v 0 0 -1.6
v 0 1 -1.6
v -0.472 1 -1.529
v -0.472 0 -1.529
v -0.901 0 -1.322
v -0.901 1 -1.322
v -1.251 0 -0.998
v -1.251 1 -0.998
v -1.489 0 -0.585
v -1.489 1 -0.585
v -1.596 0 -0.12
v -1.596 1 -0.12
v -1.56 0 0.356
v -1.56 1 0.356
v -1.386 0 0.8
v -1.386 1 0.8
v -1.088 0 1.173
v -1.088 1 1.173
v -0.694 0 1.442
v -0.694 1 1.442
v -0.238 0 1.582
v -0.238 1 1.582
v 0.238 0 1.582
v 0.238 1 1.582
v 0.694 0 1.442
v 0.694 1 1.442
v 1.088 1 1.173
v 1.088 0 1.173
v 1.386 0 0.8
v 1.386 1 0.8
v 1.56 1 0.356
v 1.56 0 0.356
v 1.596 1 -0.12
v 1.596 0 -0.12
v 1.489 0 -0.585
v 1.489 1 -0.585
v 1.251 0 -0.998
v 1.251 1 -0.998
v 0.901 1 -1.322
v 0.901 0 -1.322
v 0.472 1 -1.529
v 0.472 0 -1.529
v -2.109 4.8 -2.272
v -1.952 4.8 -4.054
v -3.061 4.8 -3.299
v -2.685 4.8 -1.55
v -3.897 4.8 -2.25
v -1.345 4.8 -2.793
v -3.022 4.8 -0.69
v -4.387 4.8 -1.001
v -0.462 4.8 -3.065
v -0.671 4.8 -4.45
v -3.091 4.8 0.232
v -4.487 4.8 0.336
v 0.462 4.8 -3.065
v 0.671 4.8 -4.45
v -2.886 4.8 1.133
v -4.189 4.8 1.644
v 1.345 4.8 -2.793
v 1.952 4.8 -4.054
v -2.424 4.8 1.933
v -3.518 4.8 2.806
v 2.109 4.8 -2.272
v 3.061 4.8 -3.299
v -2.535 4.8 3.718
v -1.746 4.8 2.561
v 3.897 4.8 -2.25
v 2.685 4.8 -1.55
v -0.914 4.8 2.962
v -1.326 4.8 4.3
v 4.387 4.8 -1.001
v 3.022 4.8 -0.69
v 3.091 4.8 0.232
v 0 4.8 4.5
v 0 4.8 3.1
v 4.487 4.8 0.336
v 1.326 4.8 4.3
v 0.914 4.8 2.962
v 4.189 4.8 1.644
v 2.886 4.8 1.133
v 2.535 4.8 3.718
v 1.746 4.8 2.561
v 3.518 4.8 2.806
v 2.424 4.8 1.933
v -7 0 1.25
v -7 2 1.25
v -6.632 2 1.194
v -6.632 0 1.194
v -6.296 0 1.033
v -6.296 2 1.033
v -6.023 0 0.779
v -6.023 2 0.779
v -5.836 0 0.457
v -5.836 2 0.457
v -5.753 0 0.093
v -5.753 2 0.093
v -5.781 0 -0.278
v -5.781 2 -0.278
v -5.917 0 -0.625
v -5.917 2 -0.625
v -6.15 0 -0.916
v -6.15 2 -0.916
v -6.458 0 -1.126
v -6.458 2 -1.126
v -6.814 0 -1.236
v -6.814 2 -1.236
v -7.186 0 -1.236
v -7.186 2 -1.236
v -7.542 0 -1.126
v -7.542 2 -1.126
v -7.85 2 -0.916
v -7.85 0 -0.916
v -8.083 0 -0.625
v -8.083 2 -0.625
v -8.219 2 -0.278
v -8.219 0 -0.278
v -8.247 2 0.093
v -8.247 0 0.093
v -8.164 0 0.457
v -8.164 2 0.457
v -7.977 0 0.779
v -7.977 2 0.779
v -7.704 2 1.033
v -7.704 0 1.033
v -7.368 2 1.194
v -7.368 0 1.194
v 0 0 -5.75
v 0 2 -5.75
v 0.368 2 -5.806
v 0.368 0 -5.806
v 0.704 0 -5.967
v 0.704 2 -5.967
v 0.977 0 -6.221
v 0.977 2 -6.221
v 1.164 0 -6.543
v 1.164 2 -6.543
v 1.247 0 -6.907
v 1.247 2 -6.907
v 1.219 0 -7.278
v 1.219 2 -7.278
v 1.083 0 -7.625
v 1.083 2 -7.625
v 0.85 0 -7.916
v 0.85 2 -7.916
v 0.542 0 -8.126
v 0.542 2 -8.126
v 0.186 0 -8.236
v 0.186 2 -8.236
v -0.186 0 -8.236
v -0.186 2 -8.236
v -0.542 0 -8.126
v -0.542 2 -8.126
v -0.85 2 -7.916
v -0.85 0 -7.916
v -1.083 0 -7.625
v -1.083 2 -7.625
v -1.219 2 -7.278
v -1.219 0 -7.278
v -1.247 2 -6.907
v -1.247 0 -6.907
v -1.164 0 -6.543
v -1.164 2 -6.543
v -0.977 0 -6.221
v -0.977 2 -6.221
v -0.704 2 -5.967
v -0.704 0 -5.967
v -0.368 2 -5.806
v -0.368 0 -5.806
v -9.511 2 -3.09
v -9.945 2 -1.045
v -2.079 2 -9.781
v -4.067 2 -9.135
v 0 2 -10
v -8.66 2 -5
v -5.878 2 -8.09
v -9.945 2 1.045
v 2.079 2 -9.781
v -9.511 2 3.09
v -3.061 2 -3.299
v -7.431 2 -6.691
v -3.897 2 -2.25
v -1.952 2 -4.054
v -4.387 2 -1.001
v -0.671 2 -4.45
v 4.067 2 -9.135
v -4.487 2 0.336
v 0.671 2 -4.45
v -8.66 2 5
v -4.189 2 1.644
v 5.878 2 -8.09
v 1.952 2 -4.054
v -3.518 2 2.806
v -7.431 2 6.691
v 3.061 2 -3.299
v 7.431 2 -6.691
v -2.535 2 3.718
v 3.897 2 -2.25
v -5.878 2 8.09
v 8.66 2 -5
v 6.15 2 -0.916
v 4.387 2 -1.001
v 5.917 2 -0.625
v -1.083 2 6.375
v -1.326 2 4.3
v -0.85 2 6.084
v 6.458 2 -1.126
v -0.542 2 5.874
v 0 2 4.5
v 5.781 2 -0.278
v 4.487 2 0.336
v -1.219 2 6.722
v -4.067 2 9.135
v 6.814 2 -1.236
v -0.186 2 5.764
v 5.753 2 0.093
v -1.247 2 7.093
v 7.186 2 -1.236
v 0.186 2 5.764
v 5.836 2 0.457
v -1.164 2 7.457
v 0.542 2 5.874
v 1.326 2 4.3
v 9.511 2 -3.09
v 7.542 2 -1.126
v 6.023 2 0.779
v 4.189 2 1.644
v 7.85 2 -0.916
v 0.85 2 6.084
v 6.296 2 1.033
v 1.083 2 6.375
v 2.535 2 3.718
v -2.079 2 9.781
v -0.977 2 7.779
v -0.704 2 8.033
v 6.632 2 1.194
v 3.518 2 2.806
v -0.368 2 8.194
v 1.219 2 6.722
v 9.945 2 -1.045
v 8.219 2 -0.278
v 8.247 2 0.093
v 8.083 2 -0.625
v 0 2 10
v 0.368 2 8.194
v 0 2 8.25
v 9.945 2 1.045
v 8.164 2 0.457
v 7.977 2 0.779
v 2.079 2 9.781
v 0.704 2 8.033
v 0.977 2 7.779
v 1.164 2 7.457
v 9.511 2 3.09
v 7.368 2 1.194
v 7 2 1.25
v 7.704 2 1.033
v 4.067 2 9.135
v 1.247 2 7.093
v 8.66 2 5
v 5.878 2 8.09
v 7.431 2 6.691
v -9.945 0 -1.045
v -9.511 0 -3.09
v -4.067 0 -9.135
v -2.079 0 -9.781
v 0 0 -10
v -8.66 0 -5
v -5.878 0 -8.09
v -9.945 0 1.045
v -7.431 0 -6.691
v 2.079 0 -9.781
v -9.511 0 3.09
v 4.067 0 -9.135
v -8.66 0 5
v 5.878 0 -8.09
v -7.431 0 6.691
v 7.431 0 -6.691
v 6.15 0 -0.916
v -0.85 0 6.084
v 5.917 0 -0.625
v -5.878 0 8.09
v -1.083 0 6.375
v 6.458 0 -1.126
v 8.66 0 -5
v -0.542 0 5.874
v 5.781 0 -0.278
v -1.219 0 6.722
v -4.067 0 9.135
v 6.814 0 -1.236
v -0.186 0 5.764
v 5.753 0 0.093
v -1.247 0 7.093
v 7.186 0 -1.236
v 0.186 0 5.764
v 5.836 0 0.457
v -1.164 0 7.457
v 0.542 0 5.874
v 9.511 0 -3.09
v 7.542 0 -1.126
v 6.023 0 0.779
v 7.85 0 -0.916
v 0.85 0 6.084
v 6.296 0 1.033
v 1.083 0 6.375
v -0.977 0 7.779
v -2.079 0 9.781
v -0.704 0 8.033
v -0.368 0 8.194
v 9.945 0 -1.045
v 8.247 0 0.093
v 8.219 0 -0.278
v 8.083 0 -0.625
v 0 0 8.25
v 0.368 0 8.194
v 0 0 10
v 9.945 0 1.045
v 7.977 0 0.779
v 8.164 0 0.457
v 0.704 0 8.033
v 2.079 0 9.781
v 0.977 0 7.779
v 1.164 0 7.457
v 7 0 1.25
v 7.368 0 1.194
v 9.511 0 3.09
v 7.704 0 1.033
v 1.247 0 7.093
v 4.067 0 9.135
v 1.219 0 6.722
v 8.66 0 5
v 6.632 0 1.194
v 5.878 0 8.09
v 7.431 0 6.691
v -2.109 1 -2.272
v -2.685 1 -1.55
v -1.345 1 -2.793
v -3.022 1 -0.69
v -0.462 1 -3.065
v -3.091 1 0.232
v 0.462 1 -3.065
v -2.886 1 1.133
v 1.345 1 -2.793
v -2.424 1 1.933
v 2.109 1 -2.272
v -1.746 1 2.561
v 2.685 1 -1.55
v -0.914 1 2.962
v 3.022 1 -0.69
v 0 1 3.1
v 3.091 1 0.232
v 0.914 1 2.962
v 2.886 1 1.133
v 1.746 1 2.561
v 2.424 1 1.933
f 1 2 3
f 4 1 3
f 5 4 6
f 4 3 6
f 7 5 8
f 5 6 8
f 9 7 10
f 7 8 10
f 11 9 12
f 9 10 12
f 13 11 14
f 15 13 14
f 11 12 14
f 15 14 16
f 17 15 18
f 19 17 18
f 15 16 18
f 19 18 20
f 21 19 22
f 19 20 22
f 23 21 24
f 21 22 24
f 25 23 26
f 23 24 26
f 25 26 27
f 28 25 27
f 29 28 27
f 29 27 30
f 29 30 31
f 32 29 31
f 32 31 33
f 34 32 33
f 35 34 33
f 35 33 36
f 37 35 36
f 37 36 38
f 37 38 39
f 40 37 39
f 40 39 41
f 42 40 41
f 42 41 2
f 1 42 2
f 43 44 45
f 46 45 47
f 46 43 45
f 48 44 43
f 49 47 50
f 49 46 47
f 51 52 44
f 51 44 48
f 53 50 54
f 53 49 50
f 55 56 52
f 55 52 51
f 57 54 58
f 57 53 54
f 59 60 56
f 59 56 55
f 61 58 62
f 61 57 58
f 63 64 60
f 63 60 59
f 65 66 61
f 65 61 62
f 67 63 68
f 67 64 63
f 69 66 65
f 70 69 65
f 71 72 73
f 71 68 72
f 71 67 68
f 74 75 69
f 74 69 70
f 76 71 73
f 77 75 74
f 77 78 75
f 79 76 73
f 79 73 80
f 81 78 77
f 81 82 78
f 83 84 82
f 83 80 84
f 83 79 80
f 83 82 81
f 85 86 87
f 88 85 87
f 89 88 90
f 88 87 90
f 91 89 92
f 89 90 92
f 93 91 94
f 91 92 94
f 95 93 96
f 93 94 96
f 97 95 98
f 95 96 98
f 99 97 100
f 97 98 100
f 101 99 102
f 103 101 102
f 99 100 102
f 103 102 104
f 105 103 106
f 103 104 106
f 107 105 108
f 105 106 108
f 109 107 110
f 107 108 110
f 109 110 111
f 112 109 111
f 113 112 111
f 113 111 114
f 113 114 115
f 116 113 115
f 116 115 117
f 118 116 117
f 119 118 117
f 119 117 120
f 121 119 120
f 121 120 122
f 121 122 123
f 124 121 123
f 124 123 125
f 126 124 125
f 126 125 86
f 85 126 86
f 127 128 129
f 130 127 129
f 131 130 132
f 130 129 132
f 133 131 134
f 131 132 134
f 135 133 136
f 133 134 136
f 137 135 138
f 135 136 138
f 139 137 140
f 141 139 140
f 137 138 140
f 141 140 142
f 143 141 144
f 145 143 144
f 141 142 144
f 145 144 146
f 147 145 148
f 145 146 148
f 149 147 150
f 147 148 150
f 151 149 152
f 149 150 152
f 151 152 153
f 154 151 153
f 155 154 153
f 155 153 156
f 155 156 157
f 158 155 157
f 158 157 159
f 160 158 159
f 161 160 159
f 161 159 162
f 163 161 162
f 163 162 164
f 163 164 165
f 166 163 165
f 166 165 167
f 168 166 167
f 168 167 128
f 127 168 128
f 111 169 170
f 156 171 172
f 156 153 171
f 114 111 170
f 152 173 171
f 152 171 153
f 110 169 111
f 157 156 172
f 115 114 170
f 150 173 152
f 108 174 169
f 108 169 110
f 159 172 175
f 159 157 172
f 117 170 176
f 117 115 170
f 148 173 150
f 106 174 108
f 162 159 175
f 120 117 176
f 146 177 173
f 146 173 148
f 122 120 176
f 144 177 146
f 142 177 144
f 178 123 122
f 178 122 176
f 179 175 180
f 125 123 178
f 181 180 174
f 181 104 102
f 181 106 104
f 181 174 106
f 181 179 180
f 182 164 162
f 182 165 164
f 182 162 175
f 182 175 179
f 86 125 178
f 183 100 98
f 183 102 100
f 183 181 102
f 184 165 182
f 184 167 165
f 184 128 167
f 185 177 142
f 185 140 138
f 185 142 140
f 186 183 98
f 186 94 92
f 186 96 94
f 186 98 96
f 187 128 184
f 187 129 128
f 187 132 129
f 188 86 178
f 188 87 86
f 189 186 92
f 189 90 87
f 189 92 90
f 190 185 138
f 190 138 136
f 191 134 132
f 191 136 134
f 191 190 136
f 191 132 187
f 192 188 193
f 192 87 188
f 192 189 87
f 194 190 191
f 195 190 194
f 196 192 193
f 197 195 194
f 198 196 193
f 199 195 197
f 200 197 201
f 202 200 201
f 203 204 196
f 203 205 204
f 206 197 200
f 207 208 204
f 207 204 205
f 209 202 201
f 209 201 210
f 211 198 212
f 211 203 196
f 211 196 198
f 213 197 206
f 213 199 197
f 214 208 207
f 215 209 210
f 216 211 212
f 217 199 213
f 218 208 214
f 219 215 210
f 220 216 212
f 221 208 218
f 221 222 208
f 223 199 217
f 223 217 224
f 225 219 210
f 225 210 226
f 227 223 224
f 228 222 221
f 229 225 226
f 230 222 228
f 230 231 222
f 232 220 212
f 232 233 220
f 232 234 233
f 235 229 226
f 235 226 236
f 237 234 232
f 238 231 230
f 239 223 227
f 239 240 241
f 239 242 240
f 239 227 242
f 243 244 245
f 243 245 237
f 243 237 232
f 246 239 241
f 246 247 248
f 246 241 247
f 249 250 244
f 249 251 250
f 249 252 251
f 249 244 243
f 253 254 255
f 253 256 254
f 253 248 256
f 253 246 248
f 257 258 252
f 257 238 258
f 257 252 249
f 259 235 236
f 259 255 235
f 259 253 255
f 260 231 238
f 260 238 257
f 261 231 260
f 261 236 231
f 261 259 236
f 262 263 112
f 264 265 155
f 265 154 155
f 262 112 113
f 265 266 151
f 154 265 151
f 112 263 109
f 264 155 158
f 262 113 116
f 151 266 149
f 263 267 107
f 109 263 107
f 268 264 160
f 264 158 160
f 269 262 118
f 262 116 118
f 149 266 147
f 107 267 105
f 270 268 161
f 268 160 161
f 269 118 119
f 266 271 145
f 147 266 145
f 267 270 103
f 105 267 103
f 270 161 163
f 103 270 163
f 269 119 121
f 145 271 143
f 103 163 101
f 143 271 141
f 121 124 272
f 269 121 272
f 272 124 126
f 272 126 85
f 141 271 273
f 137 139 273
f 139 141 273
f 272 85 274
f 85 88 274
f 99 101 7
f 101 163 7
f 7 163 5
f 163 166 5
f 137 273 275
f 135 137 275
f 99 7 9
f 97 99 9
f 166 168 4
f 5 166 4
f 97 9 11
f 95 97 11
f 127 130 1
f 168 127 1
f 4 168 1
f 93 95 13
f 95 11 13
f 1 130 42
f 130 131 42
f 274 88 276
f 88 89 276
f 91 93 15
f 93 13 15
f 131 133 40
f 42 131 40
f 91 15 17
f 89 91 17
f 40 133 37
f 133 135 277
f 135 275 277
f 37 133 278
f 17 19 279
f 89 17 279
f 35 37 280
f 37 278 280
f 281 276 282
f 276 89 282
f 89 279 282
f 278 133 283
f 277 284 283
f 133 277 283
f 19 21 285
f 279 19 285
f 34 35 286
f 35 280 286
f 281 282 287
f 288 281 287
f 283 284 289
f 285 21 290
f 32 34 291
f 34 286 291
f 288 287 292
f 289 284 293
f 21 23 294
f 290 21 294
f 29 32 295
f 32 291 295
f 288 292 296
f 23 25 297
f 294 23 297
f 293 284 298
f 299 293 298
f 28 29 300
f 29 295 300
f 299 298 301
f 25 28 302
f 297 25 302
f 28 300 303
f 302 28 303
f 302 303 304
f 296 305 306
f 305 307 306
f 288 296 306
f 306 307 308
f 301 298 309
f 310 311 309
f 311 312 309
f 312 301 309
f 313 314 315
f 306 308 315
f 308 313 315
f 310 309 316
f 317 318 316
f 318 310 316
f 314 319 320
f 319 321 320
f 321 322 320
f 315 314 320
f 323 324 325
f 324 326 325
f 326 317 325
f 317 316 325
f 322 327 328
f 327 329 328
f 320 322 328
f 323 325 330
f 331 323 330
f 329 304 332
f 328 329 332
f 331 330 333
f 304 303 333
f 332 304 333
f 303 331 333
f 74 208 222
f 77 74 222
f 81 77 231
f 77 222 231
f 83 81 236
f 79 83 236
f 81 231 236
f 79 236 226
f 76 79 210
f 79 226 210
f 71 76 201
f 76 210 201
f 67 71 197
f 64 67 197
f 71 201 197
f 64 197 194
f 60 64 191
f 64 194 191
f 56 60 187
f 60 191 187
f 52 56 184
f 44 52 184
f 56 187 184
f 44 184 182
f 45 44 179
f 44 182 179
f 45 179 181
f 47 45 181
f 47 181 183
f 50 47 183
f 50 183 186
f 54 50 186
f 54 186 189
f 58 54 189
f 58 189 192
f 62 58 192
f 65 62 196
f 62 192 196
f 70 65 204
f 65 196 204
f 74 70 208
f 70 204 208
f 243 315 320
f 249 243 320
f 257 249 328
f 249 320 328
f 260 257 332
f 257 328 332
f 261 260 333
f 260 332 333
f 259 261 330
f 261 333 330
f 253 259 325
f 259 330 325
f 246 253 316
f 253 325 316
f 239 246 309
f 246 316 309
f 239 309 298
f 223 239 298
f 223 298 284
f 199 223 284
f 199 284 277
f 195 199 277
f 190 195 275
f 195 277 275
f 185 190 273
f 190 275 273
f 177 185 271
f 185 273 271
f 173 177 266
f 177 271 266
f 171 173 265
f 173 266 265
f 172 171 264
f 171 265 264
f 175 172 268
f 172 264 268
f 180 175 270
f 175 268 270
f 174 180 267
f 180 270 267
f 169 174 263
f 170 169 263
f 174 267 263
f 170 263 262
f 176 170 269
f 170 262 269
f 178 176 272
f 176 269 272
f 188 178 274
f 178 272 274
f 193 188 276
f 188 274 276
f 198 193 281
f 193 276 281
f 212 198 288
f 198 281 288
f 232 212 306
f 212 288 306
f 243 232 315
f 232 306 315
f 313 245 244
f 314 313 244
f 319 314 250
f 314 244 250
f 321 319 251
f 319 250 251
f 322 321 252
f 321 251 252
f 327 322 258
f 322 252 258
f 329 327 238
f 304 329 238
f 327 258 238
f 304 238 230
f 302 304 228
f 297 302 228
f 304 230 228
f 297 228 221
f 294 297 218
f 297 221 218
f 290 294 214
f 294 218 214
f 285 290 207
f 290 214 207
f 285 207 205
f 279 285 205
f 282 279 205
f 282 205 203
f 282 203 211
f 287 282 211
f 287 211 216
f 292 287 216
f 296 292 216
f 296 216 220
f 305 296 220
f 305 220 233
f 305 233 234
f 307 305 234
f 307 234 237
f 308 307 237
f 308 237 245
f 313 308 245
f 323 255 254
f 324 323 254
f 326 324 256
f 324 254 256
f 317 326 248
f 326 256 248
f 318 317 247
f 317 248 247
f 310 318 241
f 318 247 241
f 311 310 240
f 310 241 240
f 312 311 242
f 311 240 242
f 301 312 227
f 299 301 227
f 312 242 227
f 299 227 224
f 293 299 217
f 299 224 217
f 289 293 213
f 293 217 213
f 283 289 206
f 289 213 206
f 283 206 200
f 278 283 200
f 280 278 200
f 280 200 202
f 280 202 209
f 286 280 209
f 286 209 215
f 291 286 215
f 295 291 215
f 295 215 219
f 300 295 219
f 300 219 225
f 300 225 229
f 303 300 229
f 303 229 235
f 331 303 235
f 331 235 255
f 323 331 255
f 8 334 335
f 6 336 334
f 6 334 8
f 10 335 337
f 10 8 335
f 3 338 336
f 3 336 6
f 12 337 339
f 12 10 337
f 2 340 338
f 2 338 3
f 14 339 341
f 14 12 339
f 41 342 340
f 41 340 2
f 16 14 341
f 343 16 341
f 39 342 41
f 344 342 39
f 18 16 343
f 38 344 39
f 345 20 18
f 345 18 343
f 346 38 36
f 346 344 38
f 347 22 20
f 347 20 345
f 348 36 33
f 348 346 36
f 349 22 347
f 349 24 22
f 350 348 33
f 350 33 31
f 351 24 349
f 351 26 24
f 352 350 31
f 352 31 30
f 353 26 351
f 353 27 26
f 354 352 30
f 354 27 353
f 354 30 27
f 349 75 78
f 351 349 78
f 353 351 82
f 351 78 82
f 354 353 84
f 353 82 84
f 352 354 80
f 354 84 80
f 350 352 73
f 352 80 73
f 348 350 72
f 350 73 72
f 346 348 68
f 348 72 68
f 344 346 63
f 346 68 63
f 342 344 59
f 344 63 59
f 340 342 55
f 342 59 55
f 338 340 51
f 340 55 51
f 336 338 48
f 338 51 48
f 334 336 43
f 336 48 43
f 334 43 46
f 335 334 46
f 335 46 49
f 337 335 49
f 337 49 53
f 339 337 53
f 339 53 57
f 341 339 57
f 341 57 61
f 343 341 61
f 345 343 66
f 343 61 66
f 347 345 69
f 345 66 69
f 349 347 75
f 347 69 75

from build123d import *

# Parameters (mm, degrees)
SKETCH_1_R                      = 10
EXTRUDE_1_DEPTH                 = 2
SKETCH_2_R                      = 4.5
EXTRUDE_2_DEPTH                 = 2.8
SKETCH_3_R                      = 3.1
CUT_EXTRUDE_1_DEPTH             = 3.8
CUT_EXTRUDE_2_REACH             = 16.644
SKETCH_4_R                      = 1.6
CUT_EXTRUDE_2_DIRECTION_2_DEPTH = 15.643770006
CUT_EXTRUDE_3_REACH             = 16.417
SKETCH_5_R                      = 1.25


with BuildPart() as part:
    # 草图1 → 凸台-拉伸1 (new body)
    with BuildSketch(Plane(origin=(0, 0, 0), x_dir=(1, 0, 0), z_dir=(0, 1, 0))):
        with Locations(Location((0, 0, 0), (0, 0, 270))):
            Circle(SKETCH_1_R)
    extrude(amount=EXTRUDE_1_DEPTH)

    # 草图2 → 凸台-拉伸2 (add)
    with BuildSketch(Plane(origin=(0, 2, 0), x_dir=(1, 0, 0), z_dir=(0, 1, 0))):
        with Locations(Location((0, 0, 0), (0, 0, 270))):
            Circle(SKETCH_2_R)
    extrude(amount=EXTRUDE_2_DEPTH)

    # 草图3 → 切除-拉伸1 (cut)
    with BuildSketch(Plane(origin=(0, 4.8, 0), x_dir=(1, 0, 0), z_dir=(0, 1, 0))):
        with Locations(Location((0, 0, 0), (0, 0, 270))):
            Circle(SKETCH_3_R)
    extrude(amount=-CUT_EXTRUDE_1_DEPTH, mode=Mode.SUBTRACT)

    # 草图4 → 切除-拉伸2 (cut, up to next)
    with BuildSketch(Plane(origin=(0, 1, 0), x_dir=(1, 0, 0), z_dir=(0, 1, 0)), mode=Mode.PRIVATE) as cut_extrude_2_sk1:
        with Locations(Location((0, 0, 0), (0, 0, 90))):
            Circle(SKETCH_4_R)
    cut_extrude_2_tool1 = extrude(cut_extrude_2_sk1.sketch, amount=-CUT_EXTRUDE_2_REACH, mode=Mode.PRIVATE) & part.part
    add(cut_extrude_2_tool1.solids().sort_by_distance((0, 1, 0))[0], mode=Mode.SUBTRACT)

    # 草图4 → 切除-拉伸2 direction 2 (cut)
    with BuildSketch(Plane(origin=(0, 1, 0), x_dir=(1, 0, 0), z_dir=(0, 1, 0))):
        with Locations(Location((0, 0, 0), (0, 0, 90))):
            Circle(SKETCH_4_R)
    extrude(amount=CUT_EXTRUDE_2_DIRECTION_2_DEPTH, mode=Mode.SUBTRACT)

    # 草图5 → 切除-拉伸3 (cut, up to next)
    with BuildSketch(Plane(origin=(0, 2, 0), x_dir=(1, 0, 0), z_dir=(0, 1, 0)), mode=Mode.PRIVATE) as cut_extrude_3_sk1:
        with Locations(Location((-7, 0, 0), (0, 0, 270))):
            Circle(SKETCH_5_R)
    cut_extrude_3_tool1 = extrude(cut_extrude_3_sk1.sketch, amount=-CUT_EXTRUDE_3_REACH, mode=Mode.PRIVATE) & part.part
    # 草图5 → 切除-拉伸3 (cut, up to next)
    with BuildSketch(Plane(origin=(0, 2, 0), x_dir=(1, 0, 0), z_dir=(0, 1, 0)), mode=Mode.PRIVATE) as cut_extrude_3_sk2:
        with Locations(Location((0, 7, 0), (0, 0, 270))):
            Circle(SKETCH_5_R)
    cut_extrude_3_tool2 = extrude(cut_extrude_3_sk2.sketch, amount=-CUT_EXTRUDE_3_REACH, mode=Mode.PRIVATE) & part.part
    # 草图5 → 切除-拉伸3 (cut, up to next)
    with BuildSketch(Plane(origin=(0, 2, 0), x_dir=(1, 0, 0), z_dir=(0, 1, 0)), mode=Mode.PRIVATE) as cut_extrude_3_sk3:
        with Locations(Location((7, 0, 0), (0, 0, 270))):
            Circle(SKETCH_5_R)
    cut_extrude_3_tool3 = extrude(cut_extrude_3_sk3.sketch, amount=-CUT_EXTRUDE_3_REACH, mode=Mode.PRIVATE) & part.part
    # 草图5 → 切除-拉伸3 (cut, up to next)
    with BuildSketch(Plane(origin=(0, 2, 0), x_dir=(1, 0, 0), z_dir=(0, 1, 0)), mode=Mode.PRIVATE) as cut_extrude_3_sk4:
        with Locations(Location((0, -7, 0), (0, 0, 270))):
            Circle(SKETCH_5_R)
    cut_extrude_3_tool4 = extrude(cut_extrude_3_sk4.sketch, amount=-CUT_EXTRUDE_3_REACH, mode=Mode.PRIVATE) & part.part
    add(cut_extrude_3_tool1.solids().sort_by_distance((-7, 2, 0))[0], mode=Mode.SUBTRACT)
    add(cut_extrude_3_tool2.solids().sort_by_distance((0, 2, -7))[0], mode=Mode.SUBTRACT)
    add(cut_extrude_3_tool3.solids().sort_by_distance((7, 2, 0))[0], mode=Mode.SUBTRACT)
    add(cut_extrude_3_tool4.solids().sort_by_distance((0, 2, 7))[0], mode=Mode.SUBTRACT)


solid = part.part
